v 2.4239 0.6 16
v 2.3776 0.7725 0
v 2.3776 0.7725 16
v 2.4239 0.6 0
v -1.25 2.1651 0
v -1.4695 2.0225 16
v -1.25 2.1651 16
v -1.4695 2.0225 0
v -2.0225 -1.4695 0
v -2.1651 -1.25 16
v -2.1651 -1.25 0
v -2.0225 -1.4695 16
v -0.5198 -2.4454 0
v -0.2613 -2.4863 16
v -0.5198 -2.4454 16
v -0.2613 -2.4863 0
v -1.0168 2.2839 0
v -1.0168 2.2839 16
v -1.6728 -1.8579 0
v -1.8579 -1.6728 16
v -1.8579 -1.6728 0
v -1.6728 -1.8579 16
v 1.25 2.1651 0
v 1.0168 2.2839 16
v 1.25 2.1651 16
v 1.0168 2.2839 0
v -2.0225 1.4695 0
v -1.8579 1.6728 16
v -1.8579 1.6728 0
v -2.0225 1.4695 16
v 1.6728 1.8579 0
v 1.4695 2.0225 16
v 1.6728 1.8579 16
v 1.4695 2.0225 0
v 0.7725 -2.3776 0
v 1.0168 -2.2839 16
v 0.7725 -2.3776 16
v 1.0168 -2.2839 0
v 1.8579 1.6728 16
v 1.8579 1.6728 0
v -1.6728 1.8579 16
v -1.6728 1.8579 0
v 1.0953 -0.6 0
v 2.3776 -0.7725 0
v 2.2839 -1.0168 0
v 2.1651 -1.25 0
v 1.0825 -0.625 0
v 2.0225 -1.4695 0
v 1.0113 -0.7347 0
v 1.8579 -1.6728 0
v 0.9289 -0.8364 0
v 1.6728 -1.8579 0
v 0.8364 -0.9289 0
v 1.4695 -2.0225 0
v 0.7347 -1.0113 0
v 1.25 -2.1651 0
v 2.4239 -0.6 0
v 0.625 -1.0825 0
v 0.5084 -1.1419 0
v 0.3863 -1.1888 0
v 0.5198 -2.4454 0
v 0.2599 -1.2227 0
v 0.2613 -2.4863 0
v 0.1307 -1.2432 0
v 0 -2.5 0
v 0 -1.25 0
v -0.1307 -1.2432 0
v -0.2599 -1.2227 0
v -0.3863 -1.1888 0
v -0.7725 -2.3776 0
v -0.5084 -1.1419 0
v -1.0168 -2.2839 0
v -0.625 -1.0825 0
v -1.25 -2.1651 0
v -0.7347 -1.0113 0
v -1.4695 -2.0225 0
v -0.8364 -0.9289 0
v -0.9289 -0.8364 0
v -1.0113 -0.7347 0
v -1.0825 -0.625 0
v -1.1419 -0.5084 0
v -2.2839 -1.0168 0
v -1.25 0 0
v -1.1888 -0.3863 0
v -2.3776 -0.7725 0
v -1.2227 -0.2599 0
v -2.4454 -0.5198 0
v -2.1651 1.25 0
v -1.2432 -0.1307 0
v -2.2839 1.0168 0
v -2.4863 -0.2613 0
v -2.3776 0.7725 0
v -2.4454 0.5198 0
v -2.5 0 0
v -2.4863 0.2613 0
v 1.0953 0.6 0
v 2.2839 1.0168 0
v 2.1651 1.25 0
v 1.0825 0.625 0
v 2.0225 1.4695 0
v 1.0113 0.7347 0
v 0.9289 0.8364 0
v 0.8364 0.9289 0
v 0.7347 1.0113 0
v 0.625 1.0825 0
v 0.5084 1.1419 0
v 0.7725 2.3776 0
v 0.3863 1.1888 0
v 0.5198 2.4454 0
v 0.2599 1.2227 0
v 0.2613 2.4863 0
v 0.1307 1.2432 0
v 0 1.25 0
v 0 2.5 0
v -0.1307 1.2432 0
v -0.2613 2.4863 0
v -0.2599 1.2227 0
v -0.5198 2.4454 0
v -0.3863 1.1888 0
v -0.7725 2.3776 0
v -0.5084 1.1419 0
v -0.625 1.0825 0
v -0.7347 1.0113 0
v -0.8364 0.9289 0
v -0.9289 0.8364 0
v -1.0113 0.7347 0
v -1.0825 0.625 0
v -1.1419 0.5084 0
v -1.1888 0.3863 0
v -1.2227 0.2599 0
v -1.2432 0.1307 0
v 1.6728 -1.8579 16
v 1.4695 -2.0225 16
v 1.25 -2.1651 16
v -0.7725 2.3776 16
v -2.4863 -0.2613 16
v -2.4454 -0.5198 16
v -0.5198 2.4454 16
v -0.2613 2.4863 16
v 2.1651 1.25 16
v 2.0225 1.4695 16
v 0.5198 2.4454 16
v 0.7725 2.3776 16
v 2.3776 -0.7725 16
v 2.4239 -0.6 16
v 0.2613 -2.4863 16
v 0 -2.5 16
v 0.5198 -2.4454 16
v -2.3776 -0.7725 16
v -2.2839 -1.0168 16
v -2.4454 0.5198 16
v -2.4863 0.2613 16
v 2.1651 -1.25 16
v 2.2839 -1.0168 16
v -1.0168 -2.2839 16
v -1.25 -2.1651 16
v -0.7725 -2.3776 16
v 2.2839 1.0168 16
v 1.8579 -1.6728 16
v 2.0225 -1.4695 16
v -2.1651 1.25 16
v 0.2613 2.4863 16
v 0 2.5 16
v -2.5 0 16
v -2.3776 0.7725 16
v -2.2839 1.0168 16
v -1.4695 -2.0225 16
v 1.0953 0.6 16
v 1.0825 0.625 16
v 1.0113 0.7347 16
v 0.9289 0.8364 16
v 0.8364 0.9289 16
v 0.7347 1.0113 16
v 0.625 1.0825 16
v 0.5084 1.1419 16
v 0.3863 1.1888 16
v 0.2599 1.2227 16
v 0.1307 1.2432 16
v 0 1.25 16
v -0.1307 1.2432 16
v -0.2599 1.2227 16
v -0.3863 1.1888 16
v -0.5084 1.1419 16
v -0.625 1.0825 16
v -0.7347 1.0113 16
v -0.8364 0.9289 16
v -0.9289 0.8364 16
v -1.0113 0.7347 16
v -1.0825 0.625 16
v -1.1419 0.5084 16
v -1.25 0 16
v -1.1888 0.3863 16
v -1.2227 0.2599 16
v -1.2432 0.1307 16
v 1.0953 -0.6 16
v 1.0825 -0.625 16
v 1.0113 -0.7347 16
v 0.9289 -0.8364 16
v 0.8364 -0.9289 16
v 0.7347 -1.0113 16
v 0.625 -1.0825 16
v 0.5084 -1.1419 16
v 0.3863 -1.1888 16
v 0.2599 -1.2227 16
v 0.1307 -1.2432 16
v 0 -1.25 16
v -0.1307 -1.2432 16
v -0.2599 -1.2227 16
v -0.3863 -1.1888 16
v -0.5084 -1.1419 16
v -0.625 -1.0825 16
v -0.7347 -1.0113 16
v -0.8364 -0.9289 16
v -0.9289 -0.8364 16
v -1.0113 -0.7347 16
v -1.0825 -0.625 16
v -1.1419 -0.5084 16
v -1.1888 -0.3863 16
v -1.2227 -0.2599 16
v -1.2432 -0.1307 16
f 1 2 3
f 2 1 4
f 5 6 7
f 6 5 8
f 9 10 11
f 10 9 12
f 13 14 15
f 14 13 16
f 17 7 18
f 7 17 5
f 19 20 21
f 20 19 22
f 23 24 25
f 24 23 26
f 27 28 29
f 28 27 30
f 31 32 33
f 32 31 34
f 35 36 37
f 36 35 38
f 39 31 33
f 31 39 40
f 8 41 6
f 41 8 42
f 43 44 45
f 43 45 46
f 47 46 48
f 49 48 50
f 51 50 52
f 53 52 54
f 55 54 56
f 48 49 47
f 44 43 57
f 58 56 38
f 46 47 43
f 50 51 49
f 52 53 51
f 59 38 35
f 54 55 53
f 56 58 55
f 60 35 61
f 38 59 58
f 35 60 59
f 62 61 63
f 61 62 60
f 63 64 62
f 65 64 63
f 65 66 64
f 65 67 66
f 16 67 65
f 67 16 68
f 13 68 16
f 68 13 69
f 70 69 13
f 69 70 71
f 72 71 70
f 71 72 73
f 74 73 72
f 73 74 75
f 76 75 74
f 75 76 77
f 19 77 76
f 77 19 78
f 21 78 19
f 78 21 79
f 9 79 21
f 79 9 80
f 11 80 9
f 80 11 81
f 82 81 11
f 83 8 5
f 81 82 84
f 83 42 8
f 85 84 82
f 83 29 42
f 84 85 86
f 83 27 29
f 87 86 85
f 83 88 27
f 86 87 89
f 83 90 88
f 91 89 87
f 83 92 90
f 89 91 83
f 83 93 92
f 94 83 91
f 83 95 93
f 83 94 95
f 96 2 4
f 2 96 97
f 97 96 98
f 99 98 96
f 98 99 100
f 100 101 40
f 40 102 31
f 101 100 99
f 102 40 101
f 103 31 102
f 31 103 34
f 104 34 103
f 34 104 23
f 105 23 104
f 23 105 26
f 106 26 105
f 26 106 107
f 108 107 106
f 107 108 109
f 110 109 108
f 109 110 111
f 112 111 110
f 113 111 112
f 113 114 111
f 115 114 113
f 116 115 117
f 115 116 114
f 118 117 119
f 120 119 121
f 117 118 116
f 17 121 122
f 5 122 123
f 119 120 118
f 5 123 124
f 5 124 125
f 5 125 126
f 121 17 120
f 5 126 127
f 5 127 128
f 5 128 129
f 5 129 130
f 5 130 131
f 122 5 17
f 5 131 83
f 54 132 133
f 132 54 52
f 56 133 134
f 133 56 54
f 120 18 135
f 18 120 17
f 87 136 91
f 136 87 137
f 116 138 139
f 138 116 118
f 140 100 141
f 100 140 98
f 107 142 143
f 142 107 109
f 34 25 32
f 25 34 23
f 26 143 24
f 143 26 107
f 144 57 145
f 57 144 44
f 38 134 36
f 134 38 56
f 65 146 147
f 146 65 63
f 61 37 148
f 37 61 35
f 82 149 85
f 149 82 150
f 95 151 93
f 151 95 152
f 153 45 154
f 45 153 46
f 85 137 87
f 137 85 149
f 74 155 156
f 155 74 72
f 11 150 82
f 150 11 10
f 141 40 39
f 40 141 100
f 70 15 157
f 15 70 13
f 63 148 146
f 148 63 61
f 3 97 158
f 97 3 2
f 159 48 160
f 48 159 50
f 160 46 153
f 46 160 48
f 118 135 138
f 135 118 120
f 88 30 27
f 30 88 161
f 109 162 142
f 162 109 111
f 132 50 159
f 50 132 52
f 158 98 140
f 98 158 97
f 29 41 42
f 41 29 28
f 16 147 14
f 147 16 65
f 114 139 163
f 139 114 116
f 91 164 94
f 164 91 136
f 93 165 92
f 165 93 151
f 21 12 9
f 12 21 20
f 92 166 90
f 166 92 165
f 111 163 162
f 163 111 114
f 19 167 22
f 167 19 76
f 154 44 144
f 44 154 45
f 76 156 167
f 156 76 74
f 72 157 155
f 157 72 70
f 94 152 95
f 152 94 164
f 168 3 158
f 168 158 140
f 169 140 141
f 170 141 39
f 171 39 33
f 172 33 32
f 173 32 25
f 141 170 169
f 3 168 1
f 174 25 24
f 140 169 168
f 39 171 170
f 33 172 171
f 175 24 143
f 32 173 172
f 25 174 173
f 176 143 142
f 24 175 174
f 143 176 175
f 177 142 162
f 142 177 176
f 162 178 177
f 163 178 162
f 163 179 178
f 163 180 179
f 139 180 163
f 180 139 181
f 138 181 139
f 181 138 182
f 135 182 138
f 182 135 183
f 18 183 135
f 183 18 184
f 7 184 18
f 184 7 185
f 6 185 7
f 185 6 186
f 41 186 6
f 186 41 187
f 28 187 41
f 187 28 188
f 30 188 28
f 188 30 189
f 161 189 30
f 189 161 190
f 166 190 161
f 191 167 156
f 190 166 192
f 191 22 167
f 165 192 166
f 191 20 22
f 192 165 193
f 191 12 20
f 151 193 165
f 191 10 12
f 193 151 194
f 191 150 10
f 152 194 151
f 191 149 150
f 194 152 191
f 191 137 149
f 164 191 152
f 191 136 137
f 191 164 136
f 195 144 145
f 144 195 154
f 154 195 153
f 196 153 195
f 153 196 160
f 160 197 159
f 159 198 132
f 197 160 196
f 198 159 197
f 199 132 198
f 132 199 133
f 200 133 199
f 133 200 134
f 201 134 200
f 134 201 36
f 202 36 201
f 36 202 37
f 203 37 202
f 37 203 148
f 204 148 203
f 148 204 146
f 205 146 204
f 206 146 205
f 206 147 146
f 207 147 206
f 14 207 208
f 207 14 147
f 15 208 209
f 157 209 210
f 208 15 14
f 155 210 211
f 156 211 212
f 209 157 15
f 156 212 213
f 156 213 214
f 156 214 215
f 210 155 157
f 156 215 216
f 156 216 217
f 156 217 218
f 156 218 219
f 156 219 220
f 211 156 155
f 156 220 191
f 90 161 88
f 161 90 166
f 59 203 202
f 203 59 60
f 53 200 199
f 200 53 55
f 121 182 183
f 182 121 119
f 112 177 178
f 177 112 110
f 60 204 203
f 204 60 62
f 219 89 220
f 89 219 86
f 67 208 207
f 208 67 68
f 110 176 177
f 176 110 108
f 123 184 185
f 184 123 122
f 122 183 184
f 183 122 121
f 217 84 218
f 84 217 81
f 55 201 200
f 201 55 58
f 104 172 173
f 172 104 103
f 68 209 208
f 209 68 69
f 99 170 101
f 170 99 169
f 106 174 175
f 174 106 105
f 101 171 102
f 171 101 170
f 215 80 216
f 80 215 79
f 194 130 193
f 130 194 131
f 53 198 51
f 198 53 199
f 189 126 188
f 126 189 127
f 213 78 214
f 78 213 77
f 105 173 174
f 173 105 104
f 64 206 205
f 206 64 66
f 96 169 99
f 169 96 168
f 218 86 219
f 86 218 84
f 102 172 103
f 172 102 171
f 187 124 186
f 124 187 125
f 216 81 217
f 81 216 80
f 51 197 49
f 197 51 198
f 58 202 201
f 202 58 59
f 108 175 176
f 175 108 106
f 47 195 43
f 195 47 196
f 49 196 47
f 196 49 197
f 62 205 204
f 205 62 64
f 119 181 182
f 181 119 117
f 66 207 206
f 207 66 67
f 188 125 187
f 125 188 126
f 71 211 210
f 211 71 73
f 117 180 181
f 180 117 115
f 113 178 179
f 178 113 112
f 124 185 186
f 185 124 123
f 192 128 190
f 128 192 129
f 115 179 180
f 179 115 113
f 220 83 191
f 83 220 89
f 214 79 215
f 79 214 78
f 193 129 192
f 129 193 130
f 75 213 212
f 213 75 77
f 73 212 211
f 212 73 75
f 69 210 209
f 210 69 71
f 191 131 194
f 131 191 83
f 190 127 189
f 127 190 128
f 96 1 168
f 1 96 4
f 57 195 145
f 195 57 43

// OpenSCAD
// Slotted spring pin sleeve.
$fn = 60;
eps = 0.02;
inner_d = 2.5;
outer_d = 5;
length = 16;
slot_w = 1.2;
difference() {
    cylinder(d = outer_d, h = length);
    translate([0, 0, -eps]) cylinder(d = inner_d, h = length + 2 * eps);
    translate([0, -slot_w / 2, -eps]) cube([outer_d / 2 + eps, slot_w, length + 2 * eps]);
}
